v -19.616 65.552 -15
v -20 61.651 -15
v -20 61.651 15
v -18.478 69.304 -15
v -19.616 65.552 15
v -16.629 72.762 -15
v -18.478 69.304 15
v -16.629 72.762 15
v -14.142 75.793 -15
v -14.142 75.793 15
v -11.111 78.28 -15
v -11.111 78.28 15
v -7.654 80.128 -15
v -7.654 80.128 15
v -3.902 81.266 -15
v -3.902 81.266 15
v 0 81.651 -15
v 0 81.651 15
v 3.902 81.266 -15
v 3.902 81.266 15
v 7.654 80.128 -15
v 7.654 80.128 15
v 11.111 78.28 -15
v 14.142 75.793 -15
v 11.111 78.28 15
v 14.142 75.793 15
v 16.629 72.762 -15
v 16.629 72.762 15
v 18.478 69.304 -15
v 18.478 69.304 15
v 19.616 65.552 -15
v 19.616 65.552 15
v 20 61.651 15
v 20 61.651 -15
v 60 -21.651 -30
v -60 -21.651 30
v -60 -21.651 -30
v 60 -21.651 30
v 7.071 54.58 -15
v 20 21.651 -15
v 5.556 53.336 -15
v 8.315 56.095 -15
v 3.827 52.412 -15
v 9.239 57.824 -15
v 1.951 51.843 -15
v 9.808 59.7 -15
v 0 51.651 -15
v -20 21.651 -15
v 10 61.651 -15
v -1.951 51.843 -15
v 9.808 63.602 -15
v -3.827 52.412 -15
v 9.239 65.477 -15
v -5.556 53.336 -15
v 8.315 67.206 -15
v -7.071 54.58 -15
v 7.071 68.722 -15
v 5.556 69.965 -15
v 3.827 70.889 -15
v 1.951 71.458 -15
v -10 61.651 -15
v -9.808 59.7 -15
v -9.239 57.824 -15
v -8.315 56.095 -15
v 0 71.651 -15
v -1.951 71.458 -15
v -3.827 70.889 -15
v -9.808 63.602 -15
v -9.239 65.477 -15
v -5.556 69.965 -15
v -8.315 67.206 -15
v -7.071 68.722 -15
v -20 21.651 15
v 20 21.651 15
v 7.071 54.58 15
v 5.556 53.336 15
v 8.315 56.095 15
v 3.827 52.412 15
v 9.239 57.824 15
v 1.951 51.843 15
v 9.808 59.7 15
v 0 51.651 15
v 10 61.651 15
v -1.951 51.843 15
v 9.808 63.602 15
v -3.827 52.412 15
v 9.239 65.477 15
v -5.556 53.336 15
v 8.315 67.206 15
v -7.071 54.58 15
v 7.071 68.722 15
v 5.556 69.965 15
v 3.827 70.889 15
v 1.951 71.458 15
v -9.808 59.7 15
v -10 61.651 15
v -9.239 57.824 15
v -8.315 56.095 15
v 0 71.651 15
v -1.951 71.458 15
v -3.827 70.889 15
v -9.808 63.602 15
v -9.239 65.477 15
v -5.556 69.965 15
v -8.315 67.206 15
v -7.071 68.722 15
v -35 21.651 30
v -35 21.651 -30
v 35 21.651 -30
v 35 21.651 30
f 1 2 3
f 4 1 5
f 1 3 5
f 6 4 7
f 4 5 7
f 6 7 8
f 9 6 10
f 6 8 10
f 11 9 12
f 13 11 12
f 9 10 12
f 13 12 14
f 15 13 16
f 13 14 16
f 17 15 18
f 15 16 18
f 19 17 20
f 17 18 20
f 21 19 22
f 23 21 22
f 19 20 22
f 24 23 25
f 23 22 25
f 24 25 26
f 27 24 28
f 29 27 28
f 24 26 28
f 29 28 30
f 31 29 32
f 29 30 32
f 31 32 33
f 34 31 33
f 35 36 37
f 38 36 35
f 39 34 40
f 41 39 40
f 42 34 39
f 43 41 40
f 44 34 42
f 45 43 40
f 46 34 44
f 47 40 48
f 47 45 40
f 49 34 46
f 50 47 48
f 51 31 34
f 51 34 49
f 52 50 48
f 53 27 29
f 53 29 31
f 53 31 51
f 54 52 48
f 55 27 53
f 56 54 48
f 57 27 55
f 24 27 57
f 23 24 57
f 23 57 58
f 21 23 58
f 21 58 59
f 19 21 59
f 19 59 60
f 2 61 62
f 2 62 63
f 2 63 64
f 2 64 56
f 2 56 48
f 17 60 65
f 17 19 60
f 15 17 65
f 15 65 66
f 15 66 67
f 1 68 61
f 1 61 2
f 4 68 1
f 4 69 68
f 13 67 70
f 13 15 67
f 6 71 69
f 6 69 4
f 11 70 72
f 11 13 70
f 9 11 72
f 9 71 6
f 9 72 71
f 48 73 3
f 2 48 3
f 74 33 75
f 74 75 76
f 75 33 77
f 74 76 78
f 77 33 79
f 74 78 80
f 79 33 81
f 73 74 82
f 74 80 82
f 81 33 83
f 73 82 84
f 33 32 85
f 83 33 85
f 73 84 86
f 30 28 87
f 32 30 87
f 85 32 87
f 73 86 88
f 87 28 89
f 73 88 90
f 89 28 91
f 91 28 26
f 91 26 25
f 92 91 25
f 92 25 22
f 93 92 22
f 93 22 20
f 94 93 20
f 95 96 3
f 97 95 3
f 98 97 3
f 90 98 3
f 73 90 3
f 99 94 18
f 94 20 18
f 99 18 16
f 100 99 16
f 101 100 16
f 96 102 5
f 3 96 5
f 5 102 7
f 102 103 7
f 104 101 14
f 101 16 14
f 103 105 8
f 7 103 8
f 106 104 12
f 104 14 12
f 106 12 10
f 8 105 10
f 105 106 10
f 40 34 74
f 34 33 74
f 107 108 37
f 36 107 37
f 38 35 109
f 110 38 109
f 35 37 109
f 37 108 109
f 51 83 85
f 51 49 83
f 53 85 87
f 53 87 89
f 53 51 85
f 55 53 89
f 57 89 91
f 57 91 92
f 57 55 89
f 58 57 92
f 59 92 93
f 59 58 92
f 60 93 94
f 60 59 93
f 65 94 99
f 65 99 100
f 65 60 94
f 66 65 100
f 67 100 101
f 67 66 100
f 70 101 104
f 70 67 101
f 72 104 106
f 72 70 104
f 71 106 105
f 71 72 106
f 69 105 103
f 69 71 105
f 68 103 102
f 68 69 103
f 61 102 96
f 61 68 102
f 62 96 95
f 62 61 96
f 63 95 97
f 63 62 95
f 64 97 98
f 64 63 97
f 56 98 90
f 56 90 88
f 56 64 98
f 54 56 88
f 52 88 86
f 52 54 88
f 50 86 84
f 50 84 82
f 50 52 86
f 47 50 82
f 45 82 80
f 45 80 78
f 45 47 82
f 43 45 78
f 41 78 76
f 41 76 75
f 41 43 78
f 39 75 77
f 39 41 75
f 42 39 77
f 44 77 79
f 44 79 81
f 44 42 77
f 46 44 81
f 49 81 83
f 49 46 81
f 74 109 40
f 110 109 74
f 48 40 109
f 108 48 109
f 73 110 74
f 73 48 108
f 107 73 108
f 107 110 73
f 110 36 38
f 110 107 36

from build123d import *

# Parameters (mm, degrees)
Y_KSEKLIK_EKSTR_ZYON1_DEPTH = 30
IZIM2_R                     = 10
Y_KSEKLIK_EKSTR_ZYON2_DEPTH = 15


with BuildPart() as part:
    # Çizim1 → Yükseklik-Ekstrüzyon1 (new, symmetric)
    with BuildSketch(Plane.XY):
        Polygon((-60, -21.650635095), (60, -21.650635095), (35, 21.650635095), (-35, 21.650635095), align=None)
    extrude(amount=Y_KSEKLIK_EKSTR_ZYON1_DEPTH, both=True)

    # Çizim2 → Yükseklik-Ekstrüzyon2 (add, symmetric)
    with BuildSketch(Plane.XY):
        with BuildLine():
            Line((-20, 21.650635095), (-20, 61.650635095))
            ThreePointArc((-20, 61.650635095), (0, 81.650635095), (20, 61.650635095))
            Line((20, 61.650635095), (20, 21.650635095))
            Line((20, 21.650635095), (-20, 21.650635095))
        make_face()
        with Locations((0, 61.650635095)):
            Circle(IZIM2_R, mode=Mode.SUBTRACT)
    extrude(amount=Y_KSEKLIK_EKSTR_ZYON2_DEPTH, both=True)


solid = part.part
